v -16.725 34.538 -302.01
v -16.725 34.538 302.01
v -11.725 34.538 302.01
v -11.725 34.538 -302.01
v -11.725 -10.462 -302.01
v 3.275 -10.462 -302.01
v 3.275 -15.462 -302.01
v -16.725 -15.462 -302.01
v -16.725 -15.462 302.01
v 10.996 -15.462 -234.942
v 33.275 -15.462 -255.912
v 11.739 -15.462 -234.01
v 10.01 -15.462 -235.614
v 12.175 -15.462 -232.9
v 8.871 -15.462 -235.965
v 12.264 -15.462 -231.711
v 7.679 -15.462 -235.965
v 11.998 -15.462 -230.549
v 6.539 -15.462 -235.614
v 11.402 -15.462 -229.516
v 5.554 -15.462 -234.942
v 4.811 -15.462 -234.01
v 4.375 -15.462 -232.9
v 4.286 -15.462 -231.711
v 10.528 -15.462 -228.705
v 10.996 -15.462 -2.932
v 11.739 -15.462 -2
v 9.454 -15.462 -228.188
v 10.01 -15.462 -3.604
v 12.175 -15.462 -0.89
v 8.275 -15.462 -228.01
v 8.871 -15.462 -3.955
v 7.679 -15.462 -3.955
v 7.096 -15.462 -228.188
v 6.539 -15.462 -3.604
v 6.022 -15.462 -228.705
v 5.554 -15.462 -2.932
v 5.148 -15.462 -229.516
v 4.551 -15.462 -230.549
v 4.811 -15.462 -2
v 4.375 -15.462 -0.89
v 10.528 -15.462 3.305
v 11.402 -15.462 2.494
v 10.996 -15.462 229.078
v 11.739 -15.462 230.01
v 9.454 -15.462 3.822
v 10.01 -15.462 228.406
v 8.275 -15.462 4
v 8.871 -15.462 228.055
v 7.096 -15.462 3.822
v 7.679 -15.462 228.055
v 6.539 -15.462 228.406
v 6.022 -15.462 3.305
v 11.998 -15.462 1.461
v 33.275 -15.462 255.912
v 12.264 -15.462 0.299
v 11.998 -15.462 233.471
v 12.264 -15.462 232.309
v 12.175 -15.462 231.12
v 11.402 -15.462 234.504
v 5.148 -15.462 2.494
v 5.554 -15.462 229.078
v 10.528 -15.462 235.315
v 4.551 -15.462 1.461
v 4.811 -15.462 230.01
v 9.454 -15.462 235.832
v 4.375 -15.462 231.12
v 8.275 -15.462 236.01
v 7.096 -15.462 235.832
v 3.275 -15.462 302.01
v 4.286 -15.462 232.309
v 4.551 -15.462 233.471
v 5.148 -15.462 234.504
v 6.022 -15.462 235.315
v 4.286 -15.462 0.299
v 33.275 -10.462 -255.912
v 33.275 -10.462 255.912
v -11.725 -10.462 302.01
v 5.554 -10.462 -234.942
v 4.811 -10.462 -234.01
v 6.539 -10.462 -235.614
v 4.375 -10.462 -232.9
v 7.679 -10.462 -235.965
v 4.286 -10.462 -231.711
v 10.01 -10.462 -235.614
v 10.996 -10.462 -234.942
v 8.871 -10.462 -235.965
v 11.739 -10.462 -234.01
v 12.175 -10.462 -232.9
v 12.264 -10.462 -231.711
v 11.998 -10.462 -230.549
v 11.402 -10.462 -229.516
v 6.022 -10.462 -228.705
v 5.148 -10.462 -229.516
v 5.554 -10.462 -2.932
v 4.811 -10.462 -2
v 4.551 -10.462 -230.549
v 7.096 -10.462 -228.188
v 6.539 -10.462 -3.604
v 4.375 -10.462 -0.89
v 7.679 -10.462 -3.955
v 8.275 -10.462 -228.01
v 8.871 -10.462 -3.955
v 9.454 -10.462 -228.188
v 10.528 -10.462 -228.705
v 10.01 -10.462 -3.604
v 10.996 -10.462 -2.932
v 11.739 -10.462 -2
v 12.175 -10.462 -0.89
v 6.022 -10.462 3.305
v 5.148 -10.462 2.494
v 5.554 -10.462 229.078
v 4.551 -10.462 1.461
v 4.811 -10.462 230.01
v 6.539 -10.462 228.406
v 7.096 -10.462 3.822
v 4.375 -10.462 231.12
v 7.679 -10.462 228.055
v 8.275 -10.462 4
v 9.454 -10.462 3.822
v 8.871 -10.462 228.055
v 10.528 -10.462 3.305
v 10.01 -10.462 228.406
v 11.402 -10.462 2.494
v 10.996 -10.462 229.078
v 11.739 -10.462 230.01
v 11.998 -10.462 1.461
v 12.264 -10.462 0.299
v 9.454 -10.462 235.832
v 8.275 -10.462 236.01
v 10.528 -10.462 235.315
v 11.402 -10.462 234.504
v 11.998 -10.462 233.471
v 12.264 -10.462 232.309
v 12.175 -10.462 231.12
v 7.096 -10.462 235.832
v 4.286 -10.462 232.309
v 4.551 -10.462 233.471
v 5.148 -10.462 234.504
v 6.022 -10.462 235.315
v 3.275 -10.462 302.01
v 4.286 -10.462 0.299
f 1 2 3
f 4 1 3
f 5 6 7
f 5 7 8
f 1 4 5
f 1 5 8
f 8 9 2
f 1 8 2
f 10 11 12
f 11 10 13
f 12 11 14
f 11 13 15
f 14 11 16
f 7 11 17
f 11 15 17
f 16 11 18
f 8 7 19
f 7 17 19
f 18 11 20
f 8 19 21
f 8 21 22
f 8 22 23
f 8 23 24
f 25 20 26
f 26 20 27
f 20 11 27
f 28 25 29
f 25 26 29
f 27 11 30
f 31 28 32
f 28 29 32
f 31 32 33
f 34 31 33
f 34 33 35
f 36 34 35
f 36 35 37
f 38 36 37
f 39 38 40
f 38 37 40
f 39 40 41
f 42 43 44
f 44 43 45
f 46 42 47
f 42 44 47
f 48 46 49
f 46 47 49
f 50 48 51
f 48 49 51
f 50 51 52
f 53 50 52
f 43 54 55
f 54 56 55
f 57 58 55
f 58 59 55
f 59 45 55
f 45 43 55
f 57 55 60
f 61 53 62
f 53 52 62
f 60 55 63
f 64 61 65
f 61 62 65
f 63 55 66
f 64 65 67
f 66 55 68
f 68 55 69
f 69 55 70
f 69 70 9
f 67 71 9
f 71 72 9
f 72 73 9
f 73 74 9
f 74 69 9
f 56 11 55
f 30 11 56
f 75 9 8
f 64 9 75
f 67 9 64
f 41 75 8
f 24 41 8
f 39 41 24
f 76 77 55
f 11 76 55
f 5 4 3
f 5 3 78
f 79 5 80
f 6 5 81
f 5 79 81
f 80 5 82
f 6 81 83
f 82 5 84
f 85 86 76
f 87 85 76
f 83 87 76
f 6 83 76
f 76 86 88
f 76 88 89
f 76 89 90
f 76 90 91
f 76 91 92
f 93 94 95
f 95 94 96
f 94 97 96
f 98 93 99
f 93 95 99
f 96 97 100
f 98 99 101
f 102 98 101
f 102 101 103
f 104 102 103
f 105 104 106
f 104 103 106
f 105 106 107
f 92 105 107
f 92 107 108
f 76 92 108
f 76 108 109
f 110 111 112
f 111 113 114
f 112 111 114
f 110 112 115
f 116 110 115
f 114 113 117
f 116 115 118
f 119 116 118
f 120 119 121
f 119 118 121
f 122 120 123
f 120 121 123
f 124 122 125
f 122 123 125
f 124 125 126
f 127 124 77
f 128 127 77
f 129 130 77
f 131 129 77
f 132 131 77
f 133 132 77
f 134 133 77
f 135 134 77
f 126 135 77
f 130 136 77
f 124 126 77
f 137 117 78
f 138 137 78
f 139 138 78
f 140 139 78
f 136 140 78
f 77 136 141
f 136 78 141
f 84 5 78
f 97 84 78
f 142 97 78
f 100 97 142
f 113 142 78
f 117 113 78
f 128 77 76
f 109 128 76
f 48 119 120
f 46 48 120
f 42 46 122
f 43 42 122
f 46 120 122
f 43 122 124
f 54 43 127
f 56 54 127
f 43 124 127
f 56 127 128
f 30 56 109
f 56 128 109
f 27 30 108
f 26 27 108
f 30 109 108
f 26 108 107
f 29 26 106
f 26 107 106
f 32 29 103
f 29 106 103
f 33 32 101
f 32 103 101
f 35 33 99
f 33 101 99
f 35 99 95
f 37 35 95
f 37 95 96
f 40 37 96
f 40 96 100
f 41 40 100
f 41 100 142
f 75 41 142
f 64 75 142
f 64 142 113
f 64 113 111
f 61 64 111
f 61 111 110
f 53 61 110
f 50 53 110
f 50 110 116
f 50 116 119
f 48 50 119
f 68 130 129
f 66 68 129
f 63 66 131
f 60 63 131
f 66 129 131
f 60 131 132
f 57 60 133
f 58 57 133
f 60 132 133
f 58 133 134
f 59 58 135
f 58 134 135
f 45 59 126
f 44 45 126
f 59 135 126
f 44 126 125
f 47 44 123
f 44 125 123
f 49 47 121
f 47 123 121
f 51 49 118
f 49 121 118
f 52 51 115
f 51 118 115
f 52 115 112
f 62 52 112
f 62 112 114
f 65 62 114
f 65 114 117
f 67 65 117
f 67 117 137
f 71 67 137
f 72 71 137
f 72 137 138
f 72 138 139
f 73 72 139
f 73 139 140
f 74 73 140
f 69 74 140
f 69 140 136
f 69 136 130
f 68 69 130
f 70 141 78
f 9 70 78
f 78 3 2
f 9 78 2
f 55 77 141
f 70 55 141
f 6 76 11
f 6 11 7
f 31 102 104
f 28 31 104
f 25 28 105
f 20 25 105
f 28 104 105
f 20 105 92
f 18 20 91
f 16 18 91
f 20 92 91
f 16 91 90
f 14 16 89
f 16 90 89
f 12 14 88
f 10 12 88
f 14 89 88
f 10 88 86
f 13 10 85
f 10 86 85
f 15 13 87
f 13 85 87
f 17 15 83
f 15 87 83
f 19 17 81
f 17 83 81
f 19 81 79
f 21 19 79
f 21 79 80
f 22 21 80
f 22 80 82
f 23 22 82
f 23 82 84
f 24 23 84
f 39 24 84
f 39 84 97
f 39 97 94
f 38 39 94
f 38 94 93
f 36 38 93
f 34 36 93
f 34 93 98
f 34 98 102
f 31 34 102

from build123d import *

# Parameters (mm, degrees)
BOSS_EXTRUDE1_DEPTH = 302.01
SKETCH2_R           = 4
CUT_EXTRUDE1_DEPTH  = 20
CUT_EXTRUDE2_DEPTH  = 8
LPATTERN1_COUNT     = 3
LPATTERN1_PITCH     = 232.01


with BuildPart() as part:
    # Sketch1 → Boss-Extrude1 (new, symmetric)
    with BuildSketch(Plane.XY):
        Polygon((-16.725146199, 34.538011696), (-11.725146199, 34.538011696), (-11.725146199, -10.461988304), (33.274853801, -10.461988304), (33.274853801, -15.461988304), (-16.725146199, -15.461988304), align=None)
    extrude(amount=BOSS_EXTRUDE1_DEPTH, both=True)

    # Sketch2 → Cut-Extrude1 (cut)
    with BuildSketch(Plane(origin=(0, -10.461988304, 0), x_dir=(1, 0, 0), z_dir=(0, 1, 0))):
        with Locations(Location((8.274853801, 232.01, 0), (0, 0, 270))):
            Circle(SKETCH2_R)
    cut_extrude1 = extrude(amount=-CUT_EXTRUDE1_DEPTH, mode=Mode.SUBTRACT)

    # Sketch3 → Cut-Extrude2 (cut)
    with BuildSketch(Plane(origin=(0, -10.461988304, 0), x_dir=(1, 0, 0), z_dir=(0, 1, 0))):
        Polygon((33.274853801, 255.912277714), (3.274853801, 302.01), (33.274853801, 302.01), align=None)
    cut_extrude2 = extrude(amount=-CUT_EXTRUDE2_DEPTH, mode=Mode.SUBTRACT)

    # Mirror2: Cut-Extrude2 across plane
    add(cut_extrude2.mirror(Plane.XY), mode=Mode.SUBTRACT)

    # LPattern1: Cut-Extrude1 ×3
    with Locations(*[(0, 0, i * LPATTERN1_PITCH) for i in range(1, LPATTERN1_COUNT)]):
        add(cut_extrude1, mode=Mode.SUBTRACT)


solid = part.part
